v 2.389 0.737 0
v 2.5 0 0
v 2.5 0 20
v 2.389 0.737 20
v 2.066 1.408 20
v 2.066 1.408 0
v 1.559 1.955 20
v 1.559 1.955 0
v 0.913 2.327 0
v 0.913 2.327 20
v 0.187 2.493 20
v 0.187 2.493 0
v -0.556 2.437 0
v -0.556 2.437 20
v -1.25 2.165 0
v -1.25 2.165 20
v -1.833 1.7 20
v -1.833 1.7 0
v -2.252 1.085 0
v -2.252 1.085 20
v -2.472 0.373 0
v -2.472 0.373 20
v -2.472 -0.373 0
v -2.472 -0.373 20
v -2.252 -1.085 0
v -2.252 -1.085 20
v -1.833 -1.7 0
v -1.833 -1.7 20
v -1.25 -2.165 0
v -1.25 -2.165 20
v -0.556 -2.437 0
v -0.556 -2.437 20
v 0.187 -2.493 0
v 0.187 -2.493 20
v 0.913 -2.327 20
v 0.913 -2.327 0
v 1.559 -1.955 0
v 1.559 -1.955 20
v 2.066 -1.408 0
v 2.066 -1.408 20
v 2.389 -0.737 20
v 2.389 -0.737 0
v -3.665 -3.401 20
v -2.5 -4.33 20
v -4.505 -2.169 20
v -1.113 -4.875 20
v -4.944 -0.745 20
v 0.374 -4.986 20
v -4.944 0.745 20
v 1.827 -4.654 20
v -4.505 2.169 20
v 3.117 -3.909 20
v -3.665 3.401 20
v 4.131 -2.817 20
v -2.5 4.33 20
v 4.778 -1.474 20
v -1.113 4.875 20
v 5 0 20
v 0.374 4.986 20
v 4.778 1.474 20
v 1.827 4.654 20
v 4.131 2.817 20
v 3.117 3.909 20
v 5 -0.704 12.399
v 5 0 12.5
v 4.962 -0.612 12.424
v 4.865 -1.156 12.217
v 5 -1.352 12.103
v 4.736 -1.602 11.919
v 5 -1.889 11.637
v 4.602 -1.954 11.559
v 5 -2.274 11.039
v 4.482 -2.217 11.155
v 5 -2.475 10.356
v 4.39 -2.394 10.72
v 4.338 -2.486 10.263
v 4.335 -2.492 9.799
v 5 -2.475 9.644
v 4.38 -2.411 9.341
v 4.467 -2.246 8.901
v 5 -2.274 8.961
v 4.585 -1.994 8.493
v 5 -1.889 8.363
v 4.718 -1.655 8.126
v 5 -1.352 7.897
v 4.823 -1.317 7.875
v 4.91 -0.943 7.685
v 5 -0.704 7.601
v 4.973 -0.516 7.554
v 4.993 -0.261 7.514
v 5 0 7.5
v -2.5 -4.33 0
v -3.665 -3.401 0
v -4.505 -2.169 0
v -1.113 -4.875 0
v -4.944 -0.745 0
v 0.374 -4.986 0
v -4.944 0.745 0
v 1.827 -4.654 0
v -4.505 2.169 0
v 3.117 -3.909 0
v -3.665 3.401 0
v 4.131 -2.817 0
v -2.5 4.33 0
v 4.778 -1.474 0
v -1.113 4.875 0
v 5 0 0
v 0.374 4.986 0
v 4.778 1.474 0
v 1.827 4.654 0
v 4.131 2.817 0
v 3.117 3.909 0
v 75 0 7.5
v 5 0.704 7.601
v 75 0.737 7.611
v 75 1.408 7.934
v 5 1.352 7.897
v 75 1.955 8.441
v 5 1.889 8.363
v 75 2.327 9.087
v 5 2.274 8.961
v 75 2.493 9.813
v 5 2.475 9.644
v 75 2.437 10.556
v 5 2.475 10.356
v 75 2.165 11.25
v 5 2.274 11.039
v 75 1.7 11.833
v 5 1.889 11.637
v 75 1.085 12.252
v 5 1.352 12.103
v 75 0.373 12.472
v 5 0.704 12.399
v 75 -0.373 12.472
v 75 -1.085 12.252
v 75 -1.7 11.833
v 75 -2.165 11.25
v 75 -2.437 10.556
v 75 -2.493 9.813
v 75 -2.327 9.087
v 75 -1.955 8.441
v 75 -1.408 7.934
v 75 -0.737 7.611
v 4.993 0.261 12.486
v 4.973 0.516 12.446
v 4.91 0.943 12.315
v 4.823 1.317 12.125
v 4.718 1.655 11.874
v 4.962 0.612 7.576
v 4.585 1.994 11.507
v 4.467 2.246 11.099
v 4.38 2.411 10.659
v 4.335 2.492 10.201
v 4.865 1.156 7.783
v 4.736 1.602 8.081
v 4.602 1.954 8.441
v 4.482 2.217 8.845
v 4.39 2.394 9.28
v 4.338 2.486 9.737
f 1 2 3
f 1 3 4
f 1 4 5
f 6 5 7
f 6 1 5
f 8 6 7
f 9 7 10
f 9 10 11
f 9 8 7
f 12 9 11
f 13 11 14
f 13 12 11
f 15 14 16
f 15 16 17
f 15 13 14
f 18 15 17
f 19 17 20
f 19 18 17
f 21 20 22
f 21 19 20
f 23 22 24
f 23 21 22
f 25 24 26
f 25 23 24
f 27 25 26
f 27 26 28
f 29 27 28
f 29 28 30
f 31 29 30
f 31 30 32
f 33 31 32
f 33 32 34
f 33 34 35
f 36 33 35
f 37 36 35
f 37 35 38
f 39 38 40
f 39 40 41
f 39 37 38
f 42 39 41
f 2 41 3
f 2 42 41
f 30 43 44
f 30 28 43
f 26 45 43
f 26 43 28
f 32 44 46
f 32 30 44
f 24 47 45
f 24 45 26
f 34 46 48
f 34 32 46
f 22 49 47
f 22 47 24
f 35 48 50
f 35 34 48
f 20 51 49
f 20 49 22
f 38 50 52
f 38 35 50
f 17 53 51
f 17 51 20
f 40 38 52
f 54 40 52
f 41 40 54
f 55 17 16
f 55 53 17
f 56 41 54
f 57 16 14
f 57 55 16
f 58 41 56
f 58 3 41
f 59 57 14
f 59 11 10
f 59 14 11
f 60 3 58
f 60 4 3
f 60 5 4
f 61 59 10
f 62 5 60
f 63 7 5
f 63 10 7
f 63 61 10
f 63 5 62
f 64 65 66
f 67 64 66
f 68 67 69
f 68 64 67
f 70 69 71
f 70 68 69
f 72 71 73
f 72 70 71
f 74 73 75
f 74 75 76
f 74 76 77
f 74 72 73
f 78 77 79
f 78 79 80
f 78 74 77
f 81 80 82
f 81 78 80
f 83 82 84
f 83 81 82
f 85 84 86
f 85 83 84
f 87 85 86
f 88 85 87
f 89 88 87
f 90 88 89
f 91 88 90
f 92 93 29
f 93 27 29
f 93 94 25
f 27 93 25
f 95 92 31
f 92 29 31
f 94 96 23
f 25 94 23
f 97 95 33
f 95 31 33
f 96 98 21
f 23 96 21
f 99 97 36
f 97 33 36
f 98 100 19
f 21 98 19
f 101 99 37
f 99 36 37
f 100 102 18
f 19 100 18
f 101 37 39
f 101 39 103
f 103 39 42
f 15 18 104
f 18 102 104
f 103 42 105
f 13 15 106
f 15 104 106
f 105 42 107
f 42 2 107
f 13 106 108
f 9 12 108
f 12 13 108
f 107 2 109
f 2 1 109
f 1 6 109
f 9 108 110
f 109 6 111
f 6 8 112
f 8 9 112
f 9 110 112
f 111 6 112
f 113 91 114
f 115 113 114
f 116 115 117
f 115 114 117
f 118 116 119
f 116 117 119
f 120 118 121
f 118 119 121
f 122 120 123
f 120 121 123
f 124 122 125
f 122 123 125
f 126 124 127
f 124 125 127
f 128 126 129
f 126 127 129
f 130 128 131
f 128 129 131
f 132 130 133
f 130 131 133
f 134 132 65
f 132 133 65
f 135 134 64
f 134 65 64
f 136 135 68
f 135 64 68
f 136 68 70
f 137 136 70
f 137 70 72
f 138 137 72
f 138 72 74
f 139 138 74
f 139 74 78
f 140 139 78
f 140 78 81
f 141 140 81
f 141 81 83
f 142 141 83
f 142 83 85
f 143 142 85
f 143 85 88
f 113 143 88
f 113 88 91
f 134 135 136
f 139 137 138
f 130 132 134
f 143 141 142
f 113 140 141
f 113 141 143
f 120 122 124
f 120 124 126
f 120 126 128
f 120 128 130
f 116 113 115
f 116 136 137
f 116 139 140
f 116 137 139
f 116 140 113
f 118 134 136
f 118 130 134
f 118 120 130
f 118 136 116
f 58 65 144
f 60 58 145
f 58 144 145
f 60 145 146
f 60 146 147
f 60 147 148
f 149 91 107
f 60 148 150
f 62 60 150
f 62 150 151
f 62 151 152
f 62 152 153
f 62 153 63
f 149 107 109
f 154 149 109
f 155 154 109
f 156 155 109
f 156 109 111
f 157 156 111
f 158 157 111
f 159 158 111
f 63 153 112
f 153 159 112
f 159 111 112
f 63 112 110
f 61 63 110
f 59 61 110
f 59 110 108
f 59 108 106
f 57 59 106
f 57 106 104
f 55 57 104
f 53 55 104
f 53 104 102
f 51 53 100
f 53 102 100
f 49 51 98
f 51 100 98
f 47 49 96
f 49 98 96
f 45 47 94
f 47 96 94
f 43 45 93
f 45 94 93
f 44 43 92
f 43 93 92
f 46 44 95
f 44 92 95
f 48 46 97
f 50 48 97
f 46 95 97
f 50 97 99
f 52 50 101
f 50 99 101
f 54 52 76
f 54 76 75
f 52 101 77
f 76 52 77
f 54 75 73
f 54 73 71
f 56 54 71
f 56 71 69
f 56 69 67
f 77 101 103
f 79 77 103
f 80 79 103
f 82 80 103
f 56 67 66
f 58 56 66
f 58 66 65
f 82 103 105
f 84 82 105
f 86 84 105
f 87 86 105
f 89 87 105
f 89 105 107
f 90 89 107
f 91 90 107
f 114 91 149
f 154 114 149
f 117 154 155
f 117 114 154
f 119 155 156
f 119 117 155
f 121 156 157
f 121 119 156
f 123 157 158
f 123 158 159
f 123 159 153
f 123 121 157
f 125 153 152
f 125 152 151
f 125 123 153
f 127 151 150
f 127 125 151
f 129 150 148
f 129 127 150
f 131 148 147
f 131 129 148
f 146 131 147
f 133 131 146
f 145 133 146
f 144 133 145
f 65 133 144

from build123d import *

# Parameters (mm, degrees)
ESQUISSE1_R                         = 5
ESQUISSE1_R_2                       = 2.5
BOSS_EXTRU_1_DEPTH                  = 20
ESQUISSE2_R                         = 2.5
BOSS_EXTRU_2_DEPTH                  = 70
BOSS_EXTRU_2_DIRECTION_2_REACH      = 24.913
BOSS_EXTRU_2_DIRECTION_2_END_RADIUS = 5


with BuildPart() as part:
    # Esquisse1 → Boss.-Extru.1 (new body)
    with BuildSketch(Plane.XY):
        Circle(ESQUISSE1_R)
        Circle(ESQUISSE1_R_2, mode=Mode.SUBTRACT)
    extrude(amount=BOSS_EXTRU_1_DEPTH)

    # Esquisse2 → Boss.-Extru.2 (add)
    with BuildSketch(Plane(origin=(5, 0, 0), x_dir=(0, 0, -1), z_dir=(1, 0, 0))):
        with Locations((-10, 0)):
            Circle(ESQUISSE2_R)
    extrude(amount=BOSS_EXTRU_2_DEPTH)

    # Boss.-Extru.2 direction 2: up to this cylinder (the profile starts outside it)
    boss_extru_2_direction_2_end = Plane(origin=(0, 0, 10), z_dir=(0, 0, -1)) * Cylinder(BOSS_EXTRU_2_DIRECTION_2_END_RADIUS, 60.826, mode=Mode.PRIVATE)
    # Esquisse2 → Boss.-Extru.2 direction 2 (add, up to the surface)
    with BuildSketch(Plane(origin=(5, 0, 0), x_dir=(0, 0, -1), z_dir=(1, 0, 0)), mode=Mode.PRIVATE) as boss_extru_2_direction_2_sk1:
        with Locations((-10, 0)):
            Circle(ESQUISSE2_R)
    boss_extru_2_direction_2_tool1 = extrude(boss_extru_2_direction_2_sk1.sketch, amount=-BOSS_EXTRU_2_DIRECTION_2_REACH, mode=Mode.PRIVATE) - boss_extru_2_direction_2_end
    add(boss_extru_2_direction_2_tool1.solids().sort_by_distance((5, 0, 10))[0])
    add(boss_extru_2_direction_2_tool1.solids().sort_by_distance((5, 0, 10))[1])


solid = part.part
